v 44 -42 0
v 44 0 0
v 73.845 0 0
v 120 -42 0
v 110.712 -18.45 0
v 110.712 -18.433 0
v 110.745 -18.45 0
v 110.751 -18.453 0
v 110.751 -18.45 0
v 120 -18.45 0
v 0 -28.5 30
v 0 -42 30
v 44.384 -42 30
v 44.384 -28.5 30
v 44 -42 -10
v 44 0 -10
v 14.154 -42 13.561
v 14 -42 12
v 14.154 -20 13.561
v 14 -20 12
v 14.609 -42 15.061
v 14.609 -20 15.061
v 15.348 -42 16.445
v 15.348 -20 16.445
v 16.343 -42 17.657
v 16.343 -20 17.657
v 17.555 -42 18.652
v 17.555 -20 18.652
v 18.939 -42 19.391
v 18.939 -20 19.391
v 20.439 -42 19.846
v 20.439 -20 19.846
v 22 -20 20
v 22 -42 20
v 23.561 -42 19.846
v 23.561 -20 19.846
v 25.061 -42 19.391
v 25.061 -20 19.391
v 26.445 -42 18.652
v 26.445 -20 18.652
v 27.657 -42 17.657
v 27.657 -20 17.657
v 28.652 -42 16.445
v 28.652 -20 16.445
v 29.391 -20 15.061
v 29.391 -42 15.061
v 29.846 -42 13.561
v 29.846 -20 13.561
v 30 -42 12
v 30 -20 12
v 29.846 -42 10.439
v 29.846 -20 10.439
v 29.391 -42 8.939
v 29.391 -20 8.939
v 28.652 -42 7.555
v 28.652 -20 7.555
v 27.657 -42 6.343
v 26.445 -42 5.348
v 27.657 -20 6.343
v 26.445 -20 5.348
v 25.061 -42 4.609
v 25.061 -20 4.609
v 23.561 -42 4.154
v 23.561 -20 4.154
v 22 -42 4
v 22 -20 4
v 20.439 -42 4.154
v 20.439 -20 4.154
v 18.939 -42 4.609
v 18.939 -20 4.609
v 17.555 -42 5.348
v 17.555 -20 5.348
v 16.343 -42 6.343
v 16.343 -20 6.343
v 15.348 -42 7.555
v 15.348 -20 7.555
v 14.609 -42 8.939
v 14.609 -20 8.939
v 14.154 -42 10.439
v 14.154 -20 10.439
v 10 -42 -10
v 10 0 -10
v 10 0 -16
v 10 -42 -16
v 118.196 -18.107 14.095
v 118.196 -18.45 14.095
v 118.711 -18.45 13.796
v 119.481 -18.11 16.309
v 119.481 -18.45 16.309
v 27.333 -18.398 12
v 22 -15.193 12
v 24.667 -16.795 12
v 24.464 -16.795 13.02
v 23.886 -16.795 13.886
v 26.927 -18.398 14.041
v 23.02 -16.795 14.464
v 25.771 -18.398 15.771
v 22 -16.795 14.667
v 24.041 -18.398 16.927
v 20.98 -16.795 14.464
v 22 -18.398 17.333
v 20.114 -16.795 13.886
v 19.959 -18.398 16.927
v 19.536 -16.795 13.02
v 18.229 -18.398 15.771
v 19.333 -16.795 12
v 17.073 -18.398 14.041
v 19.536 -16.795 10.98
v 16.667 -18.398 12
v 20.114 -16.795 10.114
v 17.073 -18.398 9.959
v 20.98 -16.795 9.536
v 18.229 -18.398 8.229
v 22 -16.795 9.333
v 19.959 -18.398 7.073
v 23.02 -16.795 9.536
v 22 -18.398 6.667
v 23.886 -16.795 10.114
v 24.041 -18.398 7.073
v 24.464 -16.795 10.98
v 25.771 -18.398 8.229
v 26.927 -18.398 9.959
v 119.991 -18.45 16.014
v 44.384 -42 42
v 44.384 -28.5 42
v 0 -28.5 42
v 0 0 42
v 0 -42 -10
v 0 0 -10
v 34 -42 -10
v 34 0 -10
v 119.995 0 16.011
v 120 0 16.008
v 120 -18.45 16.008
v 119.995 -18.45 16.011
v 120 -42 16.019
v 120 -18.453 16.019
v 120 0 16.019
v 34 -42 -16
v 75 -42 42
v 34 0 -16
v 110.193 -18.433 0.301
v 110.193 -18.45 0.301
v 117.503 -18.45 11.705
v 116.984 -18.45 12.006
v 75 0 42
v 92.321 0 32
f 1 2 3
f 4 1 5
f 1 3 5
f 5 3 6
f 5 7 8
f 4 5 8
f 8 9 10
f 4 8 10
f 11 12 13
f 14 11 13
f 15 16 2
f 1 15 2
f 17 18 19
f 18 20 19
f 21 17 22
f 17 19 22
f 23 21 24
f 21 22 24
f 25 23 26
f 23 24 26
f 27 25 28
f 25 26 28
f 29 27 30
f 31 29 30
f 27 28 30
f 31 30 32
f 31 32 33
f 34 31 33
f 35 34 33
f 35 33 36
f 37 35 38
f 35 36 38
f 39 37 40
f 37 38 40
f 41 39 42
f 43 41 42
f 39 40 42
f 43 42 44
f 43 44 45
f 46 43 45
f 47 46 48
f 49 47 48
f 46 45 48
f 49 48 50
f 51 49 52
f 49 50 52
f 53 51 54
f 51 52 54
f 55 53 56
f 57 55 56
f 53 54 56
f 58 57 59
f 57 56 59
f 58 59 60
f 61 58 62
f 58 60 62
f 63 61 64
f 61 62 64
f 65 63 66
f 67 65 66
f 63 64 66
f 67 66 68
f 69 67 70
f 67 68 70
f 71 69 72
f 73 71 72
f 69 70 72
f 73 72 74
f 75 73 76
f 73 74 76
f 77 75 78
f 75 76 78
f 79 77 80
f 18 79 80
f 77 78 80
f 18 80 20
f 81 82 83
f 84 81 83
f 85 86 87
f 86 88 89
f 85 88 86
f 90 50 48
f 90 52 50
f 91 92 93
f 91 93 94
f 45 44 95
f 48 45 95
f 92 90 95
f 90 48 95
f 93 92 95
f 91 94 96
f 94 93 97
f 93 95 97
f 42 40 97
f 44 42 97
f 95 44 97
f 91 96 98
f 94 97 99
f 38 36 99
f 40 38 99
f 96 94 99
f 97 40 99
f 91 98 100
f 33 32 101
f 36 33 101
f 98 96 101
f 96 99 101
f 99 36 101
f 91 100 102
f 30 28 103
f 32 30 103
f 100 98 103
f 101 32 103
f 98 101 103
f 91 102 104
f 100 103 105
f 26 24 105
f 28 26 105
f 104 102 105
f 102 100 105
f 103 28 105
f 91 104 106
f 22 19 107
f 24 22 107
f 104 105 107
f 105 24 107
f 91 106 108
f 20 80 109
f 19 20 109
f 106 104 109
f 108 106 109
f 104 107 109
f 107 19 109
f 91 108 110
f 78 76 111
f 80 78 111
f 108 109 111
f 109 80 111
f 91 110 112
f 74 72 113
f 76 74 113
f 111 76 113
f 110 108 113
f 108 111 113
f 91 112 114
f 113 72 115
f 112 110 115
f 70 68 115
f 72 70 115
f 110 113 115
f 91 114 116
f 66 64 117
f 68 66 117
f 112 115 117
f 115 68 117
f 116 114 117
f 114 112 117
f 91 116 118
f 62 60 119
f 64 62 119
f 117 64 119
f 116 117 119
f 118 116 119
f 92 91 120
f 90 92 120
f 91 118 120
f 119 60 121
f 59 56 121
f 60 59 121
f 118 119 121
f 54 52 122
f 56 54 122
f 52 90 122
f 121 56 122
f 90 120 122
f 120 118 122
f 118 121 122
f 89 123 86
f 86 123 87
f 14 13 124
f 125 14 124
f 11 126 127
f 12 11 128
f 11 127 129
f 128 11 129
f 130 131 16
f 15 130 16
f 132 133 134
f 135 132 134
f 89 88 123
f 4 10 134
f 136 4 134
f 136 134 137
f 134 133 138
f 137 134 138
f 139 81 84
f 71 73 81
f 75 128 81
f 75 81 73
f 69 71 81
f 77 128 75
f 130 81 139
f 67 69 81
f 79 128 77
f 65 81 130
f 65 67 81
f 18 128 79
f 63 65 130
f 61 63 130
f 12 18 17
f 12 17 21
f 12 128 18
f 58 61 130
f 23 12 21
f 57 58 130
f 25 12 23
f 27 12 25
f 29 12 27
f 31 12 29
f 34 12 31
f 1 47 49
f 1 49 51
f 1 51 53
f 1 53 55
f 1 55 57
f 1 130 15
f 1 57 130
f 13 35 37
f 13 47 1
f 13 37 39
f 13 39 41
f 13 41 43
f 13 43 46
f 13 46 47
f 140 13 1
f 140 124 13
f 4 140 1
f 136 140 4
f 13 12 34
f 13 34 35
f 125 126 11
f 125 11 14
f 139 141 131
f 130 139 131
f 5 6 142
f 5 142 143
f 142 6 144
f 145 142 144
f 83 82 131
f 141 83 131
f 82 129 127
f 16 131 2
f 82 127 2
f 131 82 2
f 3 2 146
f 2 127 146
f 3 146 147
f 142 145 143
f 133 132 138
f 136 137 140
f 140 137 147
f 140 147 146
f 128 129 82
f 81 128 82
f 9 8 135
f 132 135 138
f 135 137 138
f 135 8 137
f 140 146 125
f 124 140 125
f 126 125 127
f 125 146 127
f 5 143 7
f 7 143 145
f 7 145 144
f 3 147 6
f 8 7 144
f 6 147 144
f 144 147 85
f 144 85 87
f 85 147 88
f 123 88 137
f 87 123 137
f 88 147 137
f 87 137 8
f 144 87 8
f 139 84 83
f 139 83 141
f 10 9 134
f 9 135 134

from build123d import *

# Parameters (mm, degrees)
F0_W      = 44
F0_H      = 30
F1_DEPTH  = 42
F3_D      = 16
F3_DEPTH  = 22
F3_TIP    = 4.8068849522
F4_W      = 44.3841926754
F4_H      = 12
F5_DEPTH  = 13.5
F8_DEPTH  = 87.7304734195
F10_DEPTH = 18.45
F11_DEPTH = 0.6


with BuildPart() as f1:
    # F0 (on Front) → F1 (new body)
    with BuildSketch(Plane.XZ):
        with Locations((22, 15)):
            Rectangle(F0_W, F0_H)
        Polygon((44, 0), (0, 0), (0, -10), (10, -10), (10, -16), (34, -16), (34, -10), (44, -10), align=None)
        Polygon((44, 30), (44, 0), (120, 0), (120, 16.0192378865), (75, 42), (0, 42), (0, 30), align=None)
    extrude(amount=F1_DEPTH)

    # F3
    with Locations(Plane.XZ.offset(42)):
        with Locations((22, 12)):
            Hole(F3_D / 2, depth=F3_DEPTH)
            with Locations((0, 0, -(F3_DEPTH + F3_TIP / 2))):  # 118° drill point
                Cone(0, F3_D / 2, F3_TIP, mode=Mode.SUBTRACT)

    # F4 (on face) → F5 (cut)
    with BuildSketch(Plane.XZ.offset(42)):
        with Locations((22.1920963377, 36)):
            Rectangle(F4_W, F4_H)
    extrude(amount=-F5_DEPTH, mode=Mode.SUBTRACT)

    # F7 (on face) → F8 (cut, through all)
    with BuildSketch(Plane(origin=(36.9365334795, 0, 63.9759526419), x_dir=(0.8660254038, 0, -0.5), z_dir=(0.5, 0, 0.8660254038))):
        Polygon((95.9134295109, 0), (63.9519052838, 0), (95.9134295109, -18.4529946162), align=None)
    extrude(amount=-F8_DEPTH, mode=Mode.SUBTRACT)

    # F9 (on face) → F10 (cut)
    with BuildSketch(Plane.XZ):
        Polygon((120.1416030526, 0), (120.0014874339, 16.0108022392), (110.7117310166, 0), align=None)
    extrude(amount=F10_DEPTH, mode=Mode.SUBTRACT)

    # F11 (cut): faces of the model
    f11_faces = [f1.faces().sort_by_distance(p)[0] for p in [
        (112.9756224533, -18.4444052592, 3.9017942404),
        (119.3575829171, -9.225, 14.9010392468),
    ]]
    extrude(f11_faces, amount=-F11_DEPTH, mode=Mode.SUBTRACT)


solid = f1.part
